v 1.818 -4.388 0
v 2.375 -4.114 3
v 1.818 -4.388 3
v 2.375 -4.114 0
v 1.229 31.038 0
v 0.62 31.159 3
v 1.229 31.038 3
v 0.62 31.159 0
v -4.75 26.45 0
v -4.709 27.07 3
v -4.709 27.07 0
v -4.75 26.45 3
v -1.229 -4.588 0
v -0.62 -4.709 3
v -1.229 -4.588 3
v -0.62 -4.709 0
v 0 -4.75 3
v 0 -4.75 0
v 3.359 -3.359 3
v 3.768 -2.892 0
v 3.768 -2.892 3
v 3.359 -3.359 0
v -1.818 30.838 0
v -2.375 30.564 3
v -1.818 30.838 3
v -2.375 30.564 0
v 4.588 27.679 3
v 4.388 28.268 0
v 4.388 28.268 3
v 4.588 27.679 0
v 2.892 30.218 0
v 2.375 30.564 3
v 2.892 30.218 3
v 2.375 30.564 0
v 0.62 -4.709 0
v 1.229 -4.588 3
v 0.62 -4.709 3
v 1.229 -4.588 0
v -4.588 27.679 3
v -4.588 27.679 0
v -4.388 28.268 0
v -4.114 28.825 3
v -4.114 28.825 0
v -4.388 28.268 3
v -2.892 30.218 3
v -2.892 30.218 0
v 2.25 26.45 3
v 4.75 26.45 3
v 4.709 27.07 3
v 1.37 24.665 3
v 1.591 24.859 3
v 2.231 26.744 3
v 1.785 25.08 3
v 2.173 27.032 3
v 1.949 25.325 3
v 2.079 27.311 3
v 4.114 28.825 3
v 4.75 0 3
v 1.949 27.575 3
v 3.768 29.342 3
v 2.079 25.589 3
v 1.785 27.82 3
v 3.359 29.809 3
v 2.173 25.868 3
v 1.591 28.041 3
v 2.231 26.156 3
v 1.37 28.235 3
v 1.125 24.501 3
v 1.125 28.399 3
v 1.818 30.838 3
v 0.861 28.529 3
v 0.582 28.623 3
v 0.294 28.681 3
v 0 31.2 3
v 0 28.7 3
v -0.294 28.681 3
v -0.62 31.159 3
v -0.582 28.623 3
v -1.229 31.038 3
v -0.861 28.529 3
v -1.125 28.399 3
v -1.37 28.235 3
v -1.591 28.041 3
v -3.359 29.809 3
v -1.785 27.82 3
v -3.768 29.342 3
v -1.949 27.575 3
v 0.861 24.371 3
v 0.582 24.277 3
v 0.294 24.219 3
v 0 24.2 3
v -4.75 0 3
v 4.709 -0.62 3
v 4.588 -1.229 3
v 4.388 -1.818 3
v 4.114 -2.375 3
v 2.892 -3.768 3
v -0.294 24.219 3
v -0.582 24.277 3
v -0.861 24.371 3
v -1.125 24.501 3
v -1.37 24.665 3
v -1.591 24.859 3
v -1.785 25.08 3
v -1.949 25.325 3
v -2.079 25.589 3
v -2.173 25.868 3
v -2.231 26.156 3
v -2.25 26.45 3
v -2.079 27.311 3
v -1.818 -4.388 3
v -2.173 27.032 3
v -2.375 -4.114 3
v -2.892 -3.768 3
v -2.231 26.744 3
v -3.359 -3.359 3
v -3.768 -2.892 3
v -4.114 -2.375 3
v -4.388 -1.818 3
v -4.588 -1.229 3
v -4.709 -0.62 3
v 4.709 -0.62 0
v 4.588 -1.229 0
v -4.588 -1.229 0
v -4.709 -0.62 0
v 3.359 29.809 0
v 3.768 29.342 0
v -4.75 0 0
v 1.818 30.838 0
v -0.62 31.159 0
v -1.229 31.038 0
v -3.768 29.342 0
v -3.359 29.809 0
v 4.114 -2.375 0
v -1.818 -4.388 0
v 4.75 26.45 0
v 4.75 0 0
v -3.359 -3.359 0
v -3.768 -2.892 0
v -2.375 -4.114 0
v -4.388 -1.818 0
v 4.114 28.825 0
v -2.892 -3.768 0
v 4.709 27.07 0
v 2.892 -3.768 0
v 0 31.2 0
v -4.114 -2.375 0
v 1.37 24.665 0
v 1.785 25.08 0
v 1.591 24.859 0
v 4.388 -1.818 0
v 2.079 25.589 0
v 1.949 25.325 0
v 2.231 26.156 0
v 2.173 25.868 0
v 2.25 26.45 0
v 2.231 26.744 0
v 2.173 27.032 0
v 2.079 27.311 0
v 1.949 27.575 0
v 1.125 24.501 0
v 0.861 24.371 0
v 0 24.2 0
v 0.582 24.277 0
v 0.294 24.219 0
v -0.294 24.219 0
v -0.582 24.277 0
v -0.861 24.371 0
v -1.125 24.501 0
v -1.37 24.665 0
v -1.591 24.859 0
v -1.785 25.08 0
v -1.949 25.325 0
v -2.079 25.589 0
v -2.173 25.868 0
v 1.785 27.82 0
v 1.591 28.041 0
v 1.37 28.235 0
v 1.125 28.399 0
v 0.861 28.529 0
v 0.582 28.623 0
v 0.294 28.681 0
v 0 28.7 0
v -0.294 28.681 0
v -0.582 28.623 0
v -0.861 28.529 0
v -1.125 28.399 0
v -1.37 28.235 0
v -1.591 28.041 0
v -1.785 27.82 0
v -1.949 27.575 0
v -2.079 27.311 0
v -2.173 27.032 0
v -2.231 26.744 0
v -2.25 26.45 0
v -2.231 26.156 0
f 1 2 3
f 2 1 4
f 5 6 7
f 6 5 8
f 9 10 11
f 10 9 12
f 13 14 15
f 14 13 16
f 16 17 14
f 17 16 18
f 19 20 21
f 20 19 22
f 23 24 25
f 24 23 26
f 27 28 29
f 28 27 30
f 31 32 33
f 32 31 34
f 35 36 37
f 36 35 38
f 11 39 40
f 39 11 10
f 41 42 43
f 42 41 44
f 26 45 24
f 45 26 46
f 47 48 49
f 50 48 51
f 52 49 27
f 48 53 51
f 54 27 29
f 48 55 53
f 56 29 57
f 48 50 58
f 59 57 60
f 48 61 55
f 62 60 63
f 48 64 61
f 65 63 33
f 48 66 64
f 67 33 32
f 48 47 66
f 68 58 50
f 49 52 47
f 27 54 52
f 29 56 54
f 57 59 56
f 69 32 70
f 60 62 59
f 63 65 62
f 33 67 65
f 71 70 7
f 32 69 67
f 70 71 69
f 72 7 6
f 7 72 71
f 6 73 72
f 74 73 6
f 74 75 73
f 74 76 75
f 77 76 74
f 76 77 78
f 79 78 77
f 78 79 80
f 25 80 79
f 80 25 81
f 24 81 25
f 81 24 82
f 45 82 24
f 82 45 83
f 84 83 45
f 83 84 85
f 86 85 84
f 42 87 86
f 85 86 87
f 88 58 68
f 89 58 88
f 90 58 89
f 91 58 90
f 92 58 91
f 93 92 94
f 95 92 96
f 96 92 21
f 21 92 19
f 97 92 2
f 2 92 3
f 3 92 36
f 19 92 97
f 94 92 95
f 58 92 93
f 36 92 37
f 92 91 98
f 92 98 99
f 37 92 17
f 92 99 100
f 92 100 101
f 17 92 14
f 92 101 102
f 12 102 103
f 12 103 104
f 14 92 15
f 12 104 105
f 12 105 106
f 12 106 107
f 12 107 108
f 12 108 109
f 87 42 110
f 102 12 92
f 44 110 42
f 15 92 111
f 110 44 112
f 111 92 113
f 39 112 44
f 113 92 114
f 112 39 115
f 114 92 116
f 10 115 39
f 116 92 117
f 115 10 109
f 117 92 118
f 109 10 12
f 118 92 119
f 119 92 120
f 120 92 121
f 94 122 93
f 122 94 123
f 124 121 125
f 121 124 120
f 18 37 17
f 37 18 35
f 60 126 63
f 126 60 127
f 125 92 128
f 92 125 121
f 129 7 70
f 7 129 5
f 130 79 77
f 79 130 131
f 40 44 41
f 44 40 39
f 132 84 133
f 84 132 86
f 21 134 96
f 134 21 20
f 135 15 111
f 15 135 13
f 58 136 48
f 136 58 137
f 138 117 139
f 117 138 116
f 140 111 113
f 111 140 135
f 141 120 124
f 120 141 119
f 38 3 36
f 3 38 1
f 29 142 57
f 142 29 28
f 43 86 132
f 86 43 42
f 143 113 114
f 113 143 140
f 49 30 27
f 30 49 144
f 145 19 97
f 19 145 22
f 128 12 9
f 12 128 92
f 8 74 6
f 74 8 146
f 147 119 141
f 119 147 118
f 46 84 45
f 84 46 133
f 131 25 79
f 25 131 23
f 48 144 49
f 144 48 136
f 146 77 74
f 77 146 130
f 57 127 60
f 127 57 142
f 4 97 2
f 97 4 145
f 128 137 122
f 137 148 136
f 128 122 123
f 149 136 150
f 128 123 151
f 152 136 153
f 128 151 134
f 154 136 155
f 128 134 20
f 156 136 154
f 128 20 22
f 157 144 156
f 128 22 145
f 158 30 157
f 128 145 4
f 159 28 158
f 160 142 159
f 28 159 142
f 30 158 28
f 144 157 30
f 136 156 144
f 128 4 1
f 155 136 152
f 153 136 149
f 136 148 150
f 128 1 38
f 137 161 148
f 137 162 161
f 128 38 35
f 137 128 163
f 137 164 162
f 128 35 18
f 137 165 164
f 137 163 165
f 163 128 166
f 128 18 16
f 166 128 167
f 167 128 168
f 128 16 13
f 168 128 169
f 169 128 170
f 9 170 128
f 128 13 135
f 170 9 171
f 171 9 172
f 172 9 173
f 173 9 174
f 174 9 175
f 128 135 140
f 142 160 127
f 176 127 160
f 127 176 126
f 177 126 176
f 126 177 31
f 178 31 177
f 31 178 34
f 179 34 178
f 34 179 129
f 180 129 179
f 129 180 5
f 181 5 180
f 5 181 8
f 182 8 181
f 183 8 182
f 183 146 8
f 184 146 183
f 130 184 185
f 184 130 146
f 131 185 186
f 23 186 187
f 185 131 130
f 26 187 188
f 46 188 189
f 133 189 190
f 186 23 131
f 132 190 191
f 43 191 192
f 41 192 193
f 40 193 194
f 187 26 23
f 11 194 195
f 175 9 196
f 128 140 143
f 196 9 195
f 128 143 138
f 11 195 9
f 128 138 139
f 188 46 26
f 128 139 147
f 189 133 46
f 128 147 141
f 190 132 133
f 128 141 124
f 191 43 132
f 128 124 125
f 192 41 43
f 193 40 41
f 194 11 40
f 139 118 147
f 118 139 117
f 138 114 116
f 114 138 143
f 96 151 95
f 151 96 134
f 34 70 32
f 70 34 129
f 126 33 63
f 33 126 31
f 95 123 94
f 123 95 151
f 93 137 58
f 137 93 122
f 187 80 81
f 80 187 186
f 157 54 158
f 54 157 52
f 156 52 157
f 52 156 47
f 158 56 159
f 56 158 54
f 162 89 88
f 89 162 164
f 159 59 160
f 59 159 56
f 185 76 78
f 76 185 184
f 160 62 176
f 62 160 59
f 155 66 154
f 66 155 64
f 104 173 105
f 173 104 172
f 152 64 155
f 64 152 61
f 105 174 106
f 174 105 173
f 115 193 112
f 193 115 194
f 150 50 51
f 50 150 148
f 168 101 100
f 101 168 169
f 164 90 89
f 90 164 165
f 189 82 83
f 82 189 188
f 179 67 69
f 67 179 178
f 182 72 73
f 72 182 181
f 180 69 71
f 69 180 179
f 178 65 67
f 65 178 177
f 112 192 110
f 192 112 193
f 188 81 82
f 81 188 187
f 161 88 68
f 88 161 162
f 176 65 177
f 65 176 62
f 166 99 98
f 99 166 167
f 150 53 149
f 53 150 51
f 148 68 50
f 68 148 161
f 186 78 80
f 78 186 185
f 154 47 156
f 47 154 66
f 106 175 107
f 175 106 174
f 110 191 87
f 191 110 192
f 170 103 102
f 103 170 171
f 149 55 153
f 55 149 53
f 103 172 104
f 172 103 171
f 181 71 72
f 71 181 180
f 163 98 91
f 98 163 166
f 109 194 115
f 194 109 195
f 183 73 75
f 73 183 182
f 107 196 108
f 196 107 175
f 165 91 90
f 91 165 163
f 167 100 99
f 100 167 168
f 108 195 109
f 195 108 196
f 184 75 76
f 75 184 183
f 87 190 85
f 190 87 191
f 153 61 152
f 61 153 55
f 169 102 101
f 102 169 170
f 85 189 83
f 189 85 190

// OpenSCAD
// Chaveiro de logomarca — modelo próprio do Multiferramenta 3D
// Partes: "base" e "logo" (relevo em outra cor). O logo vem vetorizado do criador.
logo = []; lw = 40; lh = 40;            // polígonos do logo (mm) e seu tamanho
formato = "contorno";                   // contorno | circulo | retangulo
base_esp = 3; relevo_alt = 1.2; margem = 3; furo = 4.5; argola = "topo";
parte = "base";
$fn = 48;

module desenho() for (p = logo) polygon(points = p[0], paths = p[1]);
module forma() {
  if (formato == "circulo") circle(d = max(lw, lh) + 2 * margem);
  else if (formato == "retangulo") offset(r = margem) square([lw, lh], center = true);
  else offset(r = -2) offset(r = 2 + margem) desenho();
}
ext = formato == "circulo" ? max(lw, lh) / 2 + margem : (argola == "topo" ? lh / 2 + margem : lw / 2 + margem);
pos = argola == "topo" ? [0, ext + furo / 2 + 1.2] : [-(ext + furo / 2 + 1.2), 0];
// a aba vai da argola até o centro: fica sempre presa, qualquer que seja o logo
module aba() hull() { translate(pos) circle(d = furo + 5); circle(d = furo + 5); }

if (parte == "base") difference() {
  linear_extrude(base_esp) union() { forma(); aba(); }
  translate([pos[0], pos[1], -1]) cylinder(d = furo, h = base_esp + 2);
}
else if (parte == "logo") translate([0, 0, base_esp]) linear_extrude(relevo_alt) desenho();
